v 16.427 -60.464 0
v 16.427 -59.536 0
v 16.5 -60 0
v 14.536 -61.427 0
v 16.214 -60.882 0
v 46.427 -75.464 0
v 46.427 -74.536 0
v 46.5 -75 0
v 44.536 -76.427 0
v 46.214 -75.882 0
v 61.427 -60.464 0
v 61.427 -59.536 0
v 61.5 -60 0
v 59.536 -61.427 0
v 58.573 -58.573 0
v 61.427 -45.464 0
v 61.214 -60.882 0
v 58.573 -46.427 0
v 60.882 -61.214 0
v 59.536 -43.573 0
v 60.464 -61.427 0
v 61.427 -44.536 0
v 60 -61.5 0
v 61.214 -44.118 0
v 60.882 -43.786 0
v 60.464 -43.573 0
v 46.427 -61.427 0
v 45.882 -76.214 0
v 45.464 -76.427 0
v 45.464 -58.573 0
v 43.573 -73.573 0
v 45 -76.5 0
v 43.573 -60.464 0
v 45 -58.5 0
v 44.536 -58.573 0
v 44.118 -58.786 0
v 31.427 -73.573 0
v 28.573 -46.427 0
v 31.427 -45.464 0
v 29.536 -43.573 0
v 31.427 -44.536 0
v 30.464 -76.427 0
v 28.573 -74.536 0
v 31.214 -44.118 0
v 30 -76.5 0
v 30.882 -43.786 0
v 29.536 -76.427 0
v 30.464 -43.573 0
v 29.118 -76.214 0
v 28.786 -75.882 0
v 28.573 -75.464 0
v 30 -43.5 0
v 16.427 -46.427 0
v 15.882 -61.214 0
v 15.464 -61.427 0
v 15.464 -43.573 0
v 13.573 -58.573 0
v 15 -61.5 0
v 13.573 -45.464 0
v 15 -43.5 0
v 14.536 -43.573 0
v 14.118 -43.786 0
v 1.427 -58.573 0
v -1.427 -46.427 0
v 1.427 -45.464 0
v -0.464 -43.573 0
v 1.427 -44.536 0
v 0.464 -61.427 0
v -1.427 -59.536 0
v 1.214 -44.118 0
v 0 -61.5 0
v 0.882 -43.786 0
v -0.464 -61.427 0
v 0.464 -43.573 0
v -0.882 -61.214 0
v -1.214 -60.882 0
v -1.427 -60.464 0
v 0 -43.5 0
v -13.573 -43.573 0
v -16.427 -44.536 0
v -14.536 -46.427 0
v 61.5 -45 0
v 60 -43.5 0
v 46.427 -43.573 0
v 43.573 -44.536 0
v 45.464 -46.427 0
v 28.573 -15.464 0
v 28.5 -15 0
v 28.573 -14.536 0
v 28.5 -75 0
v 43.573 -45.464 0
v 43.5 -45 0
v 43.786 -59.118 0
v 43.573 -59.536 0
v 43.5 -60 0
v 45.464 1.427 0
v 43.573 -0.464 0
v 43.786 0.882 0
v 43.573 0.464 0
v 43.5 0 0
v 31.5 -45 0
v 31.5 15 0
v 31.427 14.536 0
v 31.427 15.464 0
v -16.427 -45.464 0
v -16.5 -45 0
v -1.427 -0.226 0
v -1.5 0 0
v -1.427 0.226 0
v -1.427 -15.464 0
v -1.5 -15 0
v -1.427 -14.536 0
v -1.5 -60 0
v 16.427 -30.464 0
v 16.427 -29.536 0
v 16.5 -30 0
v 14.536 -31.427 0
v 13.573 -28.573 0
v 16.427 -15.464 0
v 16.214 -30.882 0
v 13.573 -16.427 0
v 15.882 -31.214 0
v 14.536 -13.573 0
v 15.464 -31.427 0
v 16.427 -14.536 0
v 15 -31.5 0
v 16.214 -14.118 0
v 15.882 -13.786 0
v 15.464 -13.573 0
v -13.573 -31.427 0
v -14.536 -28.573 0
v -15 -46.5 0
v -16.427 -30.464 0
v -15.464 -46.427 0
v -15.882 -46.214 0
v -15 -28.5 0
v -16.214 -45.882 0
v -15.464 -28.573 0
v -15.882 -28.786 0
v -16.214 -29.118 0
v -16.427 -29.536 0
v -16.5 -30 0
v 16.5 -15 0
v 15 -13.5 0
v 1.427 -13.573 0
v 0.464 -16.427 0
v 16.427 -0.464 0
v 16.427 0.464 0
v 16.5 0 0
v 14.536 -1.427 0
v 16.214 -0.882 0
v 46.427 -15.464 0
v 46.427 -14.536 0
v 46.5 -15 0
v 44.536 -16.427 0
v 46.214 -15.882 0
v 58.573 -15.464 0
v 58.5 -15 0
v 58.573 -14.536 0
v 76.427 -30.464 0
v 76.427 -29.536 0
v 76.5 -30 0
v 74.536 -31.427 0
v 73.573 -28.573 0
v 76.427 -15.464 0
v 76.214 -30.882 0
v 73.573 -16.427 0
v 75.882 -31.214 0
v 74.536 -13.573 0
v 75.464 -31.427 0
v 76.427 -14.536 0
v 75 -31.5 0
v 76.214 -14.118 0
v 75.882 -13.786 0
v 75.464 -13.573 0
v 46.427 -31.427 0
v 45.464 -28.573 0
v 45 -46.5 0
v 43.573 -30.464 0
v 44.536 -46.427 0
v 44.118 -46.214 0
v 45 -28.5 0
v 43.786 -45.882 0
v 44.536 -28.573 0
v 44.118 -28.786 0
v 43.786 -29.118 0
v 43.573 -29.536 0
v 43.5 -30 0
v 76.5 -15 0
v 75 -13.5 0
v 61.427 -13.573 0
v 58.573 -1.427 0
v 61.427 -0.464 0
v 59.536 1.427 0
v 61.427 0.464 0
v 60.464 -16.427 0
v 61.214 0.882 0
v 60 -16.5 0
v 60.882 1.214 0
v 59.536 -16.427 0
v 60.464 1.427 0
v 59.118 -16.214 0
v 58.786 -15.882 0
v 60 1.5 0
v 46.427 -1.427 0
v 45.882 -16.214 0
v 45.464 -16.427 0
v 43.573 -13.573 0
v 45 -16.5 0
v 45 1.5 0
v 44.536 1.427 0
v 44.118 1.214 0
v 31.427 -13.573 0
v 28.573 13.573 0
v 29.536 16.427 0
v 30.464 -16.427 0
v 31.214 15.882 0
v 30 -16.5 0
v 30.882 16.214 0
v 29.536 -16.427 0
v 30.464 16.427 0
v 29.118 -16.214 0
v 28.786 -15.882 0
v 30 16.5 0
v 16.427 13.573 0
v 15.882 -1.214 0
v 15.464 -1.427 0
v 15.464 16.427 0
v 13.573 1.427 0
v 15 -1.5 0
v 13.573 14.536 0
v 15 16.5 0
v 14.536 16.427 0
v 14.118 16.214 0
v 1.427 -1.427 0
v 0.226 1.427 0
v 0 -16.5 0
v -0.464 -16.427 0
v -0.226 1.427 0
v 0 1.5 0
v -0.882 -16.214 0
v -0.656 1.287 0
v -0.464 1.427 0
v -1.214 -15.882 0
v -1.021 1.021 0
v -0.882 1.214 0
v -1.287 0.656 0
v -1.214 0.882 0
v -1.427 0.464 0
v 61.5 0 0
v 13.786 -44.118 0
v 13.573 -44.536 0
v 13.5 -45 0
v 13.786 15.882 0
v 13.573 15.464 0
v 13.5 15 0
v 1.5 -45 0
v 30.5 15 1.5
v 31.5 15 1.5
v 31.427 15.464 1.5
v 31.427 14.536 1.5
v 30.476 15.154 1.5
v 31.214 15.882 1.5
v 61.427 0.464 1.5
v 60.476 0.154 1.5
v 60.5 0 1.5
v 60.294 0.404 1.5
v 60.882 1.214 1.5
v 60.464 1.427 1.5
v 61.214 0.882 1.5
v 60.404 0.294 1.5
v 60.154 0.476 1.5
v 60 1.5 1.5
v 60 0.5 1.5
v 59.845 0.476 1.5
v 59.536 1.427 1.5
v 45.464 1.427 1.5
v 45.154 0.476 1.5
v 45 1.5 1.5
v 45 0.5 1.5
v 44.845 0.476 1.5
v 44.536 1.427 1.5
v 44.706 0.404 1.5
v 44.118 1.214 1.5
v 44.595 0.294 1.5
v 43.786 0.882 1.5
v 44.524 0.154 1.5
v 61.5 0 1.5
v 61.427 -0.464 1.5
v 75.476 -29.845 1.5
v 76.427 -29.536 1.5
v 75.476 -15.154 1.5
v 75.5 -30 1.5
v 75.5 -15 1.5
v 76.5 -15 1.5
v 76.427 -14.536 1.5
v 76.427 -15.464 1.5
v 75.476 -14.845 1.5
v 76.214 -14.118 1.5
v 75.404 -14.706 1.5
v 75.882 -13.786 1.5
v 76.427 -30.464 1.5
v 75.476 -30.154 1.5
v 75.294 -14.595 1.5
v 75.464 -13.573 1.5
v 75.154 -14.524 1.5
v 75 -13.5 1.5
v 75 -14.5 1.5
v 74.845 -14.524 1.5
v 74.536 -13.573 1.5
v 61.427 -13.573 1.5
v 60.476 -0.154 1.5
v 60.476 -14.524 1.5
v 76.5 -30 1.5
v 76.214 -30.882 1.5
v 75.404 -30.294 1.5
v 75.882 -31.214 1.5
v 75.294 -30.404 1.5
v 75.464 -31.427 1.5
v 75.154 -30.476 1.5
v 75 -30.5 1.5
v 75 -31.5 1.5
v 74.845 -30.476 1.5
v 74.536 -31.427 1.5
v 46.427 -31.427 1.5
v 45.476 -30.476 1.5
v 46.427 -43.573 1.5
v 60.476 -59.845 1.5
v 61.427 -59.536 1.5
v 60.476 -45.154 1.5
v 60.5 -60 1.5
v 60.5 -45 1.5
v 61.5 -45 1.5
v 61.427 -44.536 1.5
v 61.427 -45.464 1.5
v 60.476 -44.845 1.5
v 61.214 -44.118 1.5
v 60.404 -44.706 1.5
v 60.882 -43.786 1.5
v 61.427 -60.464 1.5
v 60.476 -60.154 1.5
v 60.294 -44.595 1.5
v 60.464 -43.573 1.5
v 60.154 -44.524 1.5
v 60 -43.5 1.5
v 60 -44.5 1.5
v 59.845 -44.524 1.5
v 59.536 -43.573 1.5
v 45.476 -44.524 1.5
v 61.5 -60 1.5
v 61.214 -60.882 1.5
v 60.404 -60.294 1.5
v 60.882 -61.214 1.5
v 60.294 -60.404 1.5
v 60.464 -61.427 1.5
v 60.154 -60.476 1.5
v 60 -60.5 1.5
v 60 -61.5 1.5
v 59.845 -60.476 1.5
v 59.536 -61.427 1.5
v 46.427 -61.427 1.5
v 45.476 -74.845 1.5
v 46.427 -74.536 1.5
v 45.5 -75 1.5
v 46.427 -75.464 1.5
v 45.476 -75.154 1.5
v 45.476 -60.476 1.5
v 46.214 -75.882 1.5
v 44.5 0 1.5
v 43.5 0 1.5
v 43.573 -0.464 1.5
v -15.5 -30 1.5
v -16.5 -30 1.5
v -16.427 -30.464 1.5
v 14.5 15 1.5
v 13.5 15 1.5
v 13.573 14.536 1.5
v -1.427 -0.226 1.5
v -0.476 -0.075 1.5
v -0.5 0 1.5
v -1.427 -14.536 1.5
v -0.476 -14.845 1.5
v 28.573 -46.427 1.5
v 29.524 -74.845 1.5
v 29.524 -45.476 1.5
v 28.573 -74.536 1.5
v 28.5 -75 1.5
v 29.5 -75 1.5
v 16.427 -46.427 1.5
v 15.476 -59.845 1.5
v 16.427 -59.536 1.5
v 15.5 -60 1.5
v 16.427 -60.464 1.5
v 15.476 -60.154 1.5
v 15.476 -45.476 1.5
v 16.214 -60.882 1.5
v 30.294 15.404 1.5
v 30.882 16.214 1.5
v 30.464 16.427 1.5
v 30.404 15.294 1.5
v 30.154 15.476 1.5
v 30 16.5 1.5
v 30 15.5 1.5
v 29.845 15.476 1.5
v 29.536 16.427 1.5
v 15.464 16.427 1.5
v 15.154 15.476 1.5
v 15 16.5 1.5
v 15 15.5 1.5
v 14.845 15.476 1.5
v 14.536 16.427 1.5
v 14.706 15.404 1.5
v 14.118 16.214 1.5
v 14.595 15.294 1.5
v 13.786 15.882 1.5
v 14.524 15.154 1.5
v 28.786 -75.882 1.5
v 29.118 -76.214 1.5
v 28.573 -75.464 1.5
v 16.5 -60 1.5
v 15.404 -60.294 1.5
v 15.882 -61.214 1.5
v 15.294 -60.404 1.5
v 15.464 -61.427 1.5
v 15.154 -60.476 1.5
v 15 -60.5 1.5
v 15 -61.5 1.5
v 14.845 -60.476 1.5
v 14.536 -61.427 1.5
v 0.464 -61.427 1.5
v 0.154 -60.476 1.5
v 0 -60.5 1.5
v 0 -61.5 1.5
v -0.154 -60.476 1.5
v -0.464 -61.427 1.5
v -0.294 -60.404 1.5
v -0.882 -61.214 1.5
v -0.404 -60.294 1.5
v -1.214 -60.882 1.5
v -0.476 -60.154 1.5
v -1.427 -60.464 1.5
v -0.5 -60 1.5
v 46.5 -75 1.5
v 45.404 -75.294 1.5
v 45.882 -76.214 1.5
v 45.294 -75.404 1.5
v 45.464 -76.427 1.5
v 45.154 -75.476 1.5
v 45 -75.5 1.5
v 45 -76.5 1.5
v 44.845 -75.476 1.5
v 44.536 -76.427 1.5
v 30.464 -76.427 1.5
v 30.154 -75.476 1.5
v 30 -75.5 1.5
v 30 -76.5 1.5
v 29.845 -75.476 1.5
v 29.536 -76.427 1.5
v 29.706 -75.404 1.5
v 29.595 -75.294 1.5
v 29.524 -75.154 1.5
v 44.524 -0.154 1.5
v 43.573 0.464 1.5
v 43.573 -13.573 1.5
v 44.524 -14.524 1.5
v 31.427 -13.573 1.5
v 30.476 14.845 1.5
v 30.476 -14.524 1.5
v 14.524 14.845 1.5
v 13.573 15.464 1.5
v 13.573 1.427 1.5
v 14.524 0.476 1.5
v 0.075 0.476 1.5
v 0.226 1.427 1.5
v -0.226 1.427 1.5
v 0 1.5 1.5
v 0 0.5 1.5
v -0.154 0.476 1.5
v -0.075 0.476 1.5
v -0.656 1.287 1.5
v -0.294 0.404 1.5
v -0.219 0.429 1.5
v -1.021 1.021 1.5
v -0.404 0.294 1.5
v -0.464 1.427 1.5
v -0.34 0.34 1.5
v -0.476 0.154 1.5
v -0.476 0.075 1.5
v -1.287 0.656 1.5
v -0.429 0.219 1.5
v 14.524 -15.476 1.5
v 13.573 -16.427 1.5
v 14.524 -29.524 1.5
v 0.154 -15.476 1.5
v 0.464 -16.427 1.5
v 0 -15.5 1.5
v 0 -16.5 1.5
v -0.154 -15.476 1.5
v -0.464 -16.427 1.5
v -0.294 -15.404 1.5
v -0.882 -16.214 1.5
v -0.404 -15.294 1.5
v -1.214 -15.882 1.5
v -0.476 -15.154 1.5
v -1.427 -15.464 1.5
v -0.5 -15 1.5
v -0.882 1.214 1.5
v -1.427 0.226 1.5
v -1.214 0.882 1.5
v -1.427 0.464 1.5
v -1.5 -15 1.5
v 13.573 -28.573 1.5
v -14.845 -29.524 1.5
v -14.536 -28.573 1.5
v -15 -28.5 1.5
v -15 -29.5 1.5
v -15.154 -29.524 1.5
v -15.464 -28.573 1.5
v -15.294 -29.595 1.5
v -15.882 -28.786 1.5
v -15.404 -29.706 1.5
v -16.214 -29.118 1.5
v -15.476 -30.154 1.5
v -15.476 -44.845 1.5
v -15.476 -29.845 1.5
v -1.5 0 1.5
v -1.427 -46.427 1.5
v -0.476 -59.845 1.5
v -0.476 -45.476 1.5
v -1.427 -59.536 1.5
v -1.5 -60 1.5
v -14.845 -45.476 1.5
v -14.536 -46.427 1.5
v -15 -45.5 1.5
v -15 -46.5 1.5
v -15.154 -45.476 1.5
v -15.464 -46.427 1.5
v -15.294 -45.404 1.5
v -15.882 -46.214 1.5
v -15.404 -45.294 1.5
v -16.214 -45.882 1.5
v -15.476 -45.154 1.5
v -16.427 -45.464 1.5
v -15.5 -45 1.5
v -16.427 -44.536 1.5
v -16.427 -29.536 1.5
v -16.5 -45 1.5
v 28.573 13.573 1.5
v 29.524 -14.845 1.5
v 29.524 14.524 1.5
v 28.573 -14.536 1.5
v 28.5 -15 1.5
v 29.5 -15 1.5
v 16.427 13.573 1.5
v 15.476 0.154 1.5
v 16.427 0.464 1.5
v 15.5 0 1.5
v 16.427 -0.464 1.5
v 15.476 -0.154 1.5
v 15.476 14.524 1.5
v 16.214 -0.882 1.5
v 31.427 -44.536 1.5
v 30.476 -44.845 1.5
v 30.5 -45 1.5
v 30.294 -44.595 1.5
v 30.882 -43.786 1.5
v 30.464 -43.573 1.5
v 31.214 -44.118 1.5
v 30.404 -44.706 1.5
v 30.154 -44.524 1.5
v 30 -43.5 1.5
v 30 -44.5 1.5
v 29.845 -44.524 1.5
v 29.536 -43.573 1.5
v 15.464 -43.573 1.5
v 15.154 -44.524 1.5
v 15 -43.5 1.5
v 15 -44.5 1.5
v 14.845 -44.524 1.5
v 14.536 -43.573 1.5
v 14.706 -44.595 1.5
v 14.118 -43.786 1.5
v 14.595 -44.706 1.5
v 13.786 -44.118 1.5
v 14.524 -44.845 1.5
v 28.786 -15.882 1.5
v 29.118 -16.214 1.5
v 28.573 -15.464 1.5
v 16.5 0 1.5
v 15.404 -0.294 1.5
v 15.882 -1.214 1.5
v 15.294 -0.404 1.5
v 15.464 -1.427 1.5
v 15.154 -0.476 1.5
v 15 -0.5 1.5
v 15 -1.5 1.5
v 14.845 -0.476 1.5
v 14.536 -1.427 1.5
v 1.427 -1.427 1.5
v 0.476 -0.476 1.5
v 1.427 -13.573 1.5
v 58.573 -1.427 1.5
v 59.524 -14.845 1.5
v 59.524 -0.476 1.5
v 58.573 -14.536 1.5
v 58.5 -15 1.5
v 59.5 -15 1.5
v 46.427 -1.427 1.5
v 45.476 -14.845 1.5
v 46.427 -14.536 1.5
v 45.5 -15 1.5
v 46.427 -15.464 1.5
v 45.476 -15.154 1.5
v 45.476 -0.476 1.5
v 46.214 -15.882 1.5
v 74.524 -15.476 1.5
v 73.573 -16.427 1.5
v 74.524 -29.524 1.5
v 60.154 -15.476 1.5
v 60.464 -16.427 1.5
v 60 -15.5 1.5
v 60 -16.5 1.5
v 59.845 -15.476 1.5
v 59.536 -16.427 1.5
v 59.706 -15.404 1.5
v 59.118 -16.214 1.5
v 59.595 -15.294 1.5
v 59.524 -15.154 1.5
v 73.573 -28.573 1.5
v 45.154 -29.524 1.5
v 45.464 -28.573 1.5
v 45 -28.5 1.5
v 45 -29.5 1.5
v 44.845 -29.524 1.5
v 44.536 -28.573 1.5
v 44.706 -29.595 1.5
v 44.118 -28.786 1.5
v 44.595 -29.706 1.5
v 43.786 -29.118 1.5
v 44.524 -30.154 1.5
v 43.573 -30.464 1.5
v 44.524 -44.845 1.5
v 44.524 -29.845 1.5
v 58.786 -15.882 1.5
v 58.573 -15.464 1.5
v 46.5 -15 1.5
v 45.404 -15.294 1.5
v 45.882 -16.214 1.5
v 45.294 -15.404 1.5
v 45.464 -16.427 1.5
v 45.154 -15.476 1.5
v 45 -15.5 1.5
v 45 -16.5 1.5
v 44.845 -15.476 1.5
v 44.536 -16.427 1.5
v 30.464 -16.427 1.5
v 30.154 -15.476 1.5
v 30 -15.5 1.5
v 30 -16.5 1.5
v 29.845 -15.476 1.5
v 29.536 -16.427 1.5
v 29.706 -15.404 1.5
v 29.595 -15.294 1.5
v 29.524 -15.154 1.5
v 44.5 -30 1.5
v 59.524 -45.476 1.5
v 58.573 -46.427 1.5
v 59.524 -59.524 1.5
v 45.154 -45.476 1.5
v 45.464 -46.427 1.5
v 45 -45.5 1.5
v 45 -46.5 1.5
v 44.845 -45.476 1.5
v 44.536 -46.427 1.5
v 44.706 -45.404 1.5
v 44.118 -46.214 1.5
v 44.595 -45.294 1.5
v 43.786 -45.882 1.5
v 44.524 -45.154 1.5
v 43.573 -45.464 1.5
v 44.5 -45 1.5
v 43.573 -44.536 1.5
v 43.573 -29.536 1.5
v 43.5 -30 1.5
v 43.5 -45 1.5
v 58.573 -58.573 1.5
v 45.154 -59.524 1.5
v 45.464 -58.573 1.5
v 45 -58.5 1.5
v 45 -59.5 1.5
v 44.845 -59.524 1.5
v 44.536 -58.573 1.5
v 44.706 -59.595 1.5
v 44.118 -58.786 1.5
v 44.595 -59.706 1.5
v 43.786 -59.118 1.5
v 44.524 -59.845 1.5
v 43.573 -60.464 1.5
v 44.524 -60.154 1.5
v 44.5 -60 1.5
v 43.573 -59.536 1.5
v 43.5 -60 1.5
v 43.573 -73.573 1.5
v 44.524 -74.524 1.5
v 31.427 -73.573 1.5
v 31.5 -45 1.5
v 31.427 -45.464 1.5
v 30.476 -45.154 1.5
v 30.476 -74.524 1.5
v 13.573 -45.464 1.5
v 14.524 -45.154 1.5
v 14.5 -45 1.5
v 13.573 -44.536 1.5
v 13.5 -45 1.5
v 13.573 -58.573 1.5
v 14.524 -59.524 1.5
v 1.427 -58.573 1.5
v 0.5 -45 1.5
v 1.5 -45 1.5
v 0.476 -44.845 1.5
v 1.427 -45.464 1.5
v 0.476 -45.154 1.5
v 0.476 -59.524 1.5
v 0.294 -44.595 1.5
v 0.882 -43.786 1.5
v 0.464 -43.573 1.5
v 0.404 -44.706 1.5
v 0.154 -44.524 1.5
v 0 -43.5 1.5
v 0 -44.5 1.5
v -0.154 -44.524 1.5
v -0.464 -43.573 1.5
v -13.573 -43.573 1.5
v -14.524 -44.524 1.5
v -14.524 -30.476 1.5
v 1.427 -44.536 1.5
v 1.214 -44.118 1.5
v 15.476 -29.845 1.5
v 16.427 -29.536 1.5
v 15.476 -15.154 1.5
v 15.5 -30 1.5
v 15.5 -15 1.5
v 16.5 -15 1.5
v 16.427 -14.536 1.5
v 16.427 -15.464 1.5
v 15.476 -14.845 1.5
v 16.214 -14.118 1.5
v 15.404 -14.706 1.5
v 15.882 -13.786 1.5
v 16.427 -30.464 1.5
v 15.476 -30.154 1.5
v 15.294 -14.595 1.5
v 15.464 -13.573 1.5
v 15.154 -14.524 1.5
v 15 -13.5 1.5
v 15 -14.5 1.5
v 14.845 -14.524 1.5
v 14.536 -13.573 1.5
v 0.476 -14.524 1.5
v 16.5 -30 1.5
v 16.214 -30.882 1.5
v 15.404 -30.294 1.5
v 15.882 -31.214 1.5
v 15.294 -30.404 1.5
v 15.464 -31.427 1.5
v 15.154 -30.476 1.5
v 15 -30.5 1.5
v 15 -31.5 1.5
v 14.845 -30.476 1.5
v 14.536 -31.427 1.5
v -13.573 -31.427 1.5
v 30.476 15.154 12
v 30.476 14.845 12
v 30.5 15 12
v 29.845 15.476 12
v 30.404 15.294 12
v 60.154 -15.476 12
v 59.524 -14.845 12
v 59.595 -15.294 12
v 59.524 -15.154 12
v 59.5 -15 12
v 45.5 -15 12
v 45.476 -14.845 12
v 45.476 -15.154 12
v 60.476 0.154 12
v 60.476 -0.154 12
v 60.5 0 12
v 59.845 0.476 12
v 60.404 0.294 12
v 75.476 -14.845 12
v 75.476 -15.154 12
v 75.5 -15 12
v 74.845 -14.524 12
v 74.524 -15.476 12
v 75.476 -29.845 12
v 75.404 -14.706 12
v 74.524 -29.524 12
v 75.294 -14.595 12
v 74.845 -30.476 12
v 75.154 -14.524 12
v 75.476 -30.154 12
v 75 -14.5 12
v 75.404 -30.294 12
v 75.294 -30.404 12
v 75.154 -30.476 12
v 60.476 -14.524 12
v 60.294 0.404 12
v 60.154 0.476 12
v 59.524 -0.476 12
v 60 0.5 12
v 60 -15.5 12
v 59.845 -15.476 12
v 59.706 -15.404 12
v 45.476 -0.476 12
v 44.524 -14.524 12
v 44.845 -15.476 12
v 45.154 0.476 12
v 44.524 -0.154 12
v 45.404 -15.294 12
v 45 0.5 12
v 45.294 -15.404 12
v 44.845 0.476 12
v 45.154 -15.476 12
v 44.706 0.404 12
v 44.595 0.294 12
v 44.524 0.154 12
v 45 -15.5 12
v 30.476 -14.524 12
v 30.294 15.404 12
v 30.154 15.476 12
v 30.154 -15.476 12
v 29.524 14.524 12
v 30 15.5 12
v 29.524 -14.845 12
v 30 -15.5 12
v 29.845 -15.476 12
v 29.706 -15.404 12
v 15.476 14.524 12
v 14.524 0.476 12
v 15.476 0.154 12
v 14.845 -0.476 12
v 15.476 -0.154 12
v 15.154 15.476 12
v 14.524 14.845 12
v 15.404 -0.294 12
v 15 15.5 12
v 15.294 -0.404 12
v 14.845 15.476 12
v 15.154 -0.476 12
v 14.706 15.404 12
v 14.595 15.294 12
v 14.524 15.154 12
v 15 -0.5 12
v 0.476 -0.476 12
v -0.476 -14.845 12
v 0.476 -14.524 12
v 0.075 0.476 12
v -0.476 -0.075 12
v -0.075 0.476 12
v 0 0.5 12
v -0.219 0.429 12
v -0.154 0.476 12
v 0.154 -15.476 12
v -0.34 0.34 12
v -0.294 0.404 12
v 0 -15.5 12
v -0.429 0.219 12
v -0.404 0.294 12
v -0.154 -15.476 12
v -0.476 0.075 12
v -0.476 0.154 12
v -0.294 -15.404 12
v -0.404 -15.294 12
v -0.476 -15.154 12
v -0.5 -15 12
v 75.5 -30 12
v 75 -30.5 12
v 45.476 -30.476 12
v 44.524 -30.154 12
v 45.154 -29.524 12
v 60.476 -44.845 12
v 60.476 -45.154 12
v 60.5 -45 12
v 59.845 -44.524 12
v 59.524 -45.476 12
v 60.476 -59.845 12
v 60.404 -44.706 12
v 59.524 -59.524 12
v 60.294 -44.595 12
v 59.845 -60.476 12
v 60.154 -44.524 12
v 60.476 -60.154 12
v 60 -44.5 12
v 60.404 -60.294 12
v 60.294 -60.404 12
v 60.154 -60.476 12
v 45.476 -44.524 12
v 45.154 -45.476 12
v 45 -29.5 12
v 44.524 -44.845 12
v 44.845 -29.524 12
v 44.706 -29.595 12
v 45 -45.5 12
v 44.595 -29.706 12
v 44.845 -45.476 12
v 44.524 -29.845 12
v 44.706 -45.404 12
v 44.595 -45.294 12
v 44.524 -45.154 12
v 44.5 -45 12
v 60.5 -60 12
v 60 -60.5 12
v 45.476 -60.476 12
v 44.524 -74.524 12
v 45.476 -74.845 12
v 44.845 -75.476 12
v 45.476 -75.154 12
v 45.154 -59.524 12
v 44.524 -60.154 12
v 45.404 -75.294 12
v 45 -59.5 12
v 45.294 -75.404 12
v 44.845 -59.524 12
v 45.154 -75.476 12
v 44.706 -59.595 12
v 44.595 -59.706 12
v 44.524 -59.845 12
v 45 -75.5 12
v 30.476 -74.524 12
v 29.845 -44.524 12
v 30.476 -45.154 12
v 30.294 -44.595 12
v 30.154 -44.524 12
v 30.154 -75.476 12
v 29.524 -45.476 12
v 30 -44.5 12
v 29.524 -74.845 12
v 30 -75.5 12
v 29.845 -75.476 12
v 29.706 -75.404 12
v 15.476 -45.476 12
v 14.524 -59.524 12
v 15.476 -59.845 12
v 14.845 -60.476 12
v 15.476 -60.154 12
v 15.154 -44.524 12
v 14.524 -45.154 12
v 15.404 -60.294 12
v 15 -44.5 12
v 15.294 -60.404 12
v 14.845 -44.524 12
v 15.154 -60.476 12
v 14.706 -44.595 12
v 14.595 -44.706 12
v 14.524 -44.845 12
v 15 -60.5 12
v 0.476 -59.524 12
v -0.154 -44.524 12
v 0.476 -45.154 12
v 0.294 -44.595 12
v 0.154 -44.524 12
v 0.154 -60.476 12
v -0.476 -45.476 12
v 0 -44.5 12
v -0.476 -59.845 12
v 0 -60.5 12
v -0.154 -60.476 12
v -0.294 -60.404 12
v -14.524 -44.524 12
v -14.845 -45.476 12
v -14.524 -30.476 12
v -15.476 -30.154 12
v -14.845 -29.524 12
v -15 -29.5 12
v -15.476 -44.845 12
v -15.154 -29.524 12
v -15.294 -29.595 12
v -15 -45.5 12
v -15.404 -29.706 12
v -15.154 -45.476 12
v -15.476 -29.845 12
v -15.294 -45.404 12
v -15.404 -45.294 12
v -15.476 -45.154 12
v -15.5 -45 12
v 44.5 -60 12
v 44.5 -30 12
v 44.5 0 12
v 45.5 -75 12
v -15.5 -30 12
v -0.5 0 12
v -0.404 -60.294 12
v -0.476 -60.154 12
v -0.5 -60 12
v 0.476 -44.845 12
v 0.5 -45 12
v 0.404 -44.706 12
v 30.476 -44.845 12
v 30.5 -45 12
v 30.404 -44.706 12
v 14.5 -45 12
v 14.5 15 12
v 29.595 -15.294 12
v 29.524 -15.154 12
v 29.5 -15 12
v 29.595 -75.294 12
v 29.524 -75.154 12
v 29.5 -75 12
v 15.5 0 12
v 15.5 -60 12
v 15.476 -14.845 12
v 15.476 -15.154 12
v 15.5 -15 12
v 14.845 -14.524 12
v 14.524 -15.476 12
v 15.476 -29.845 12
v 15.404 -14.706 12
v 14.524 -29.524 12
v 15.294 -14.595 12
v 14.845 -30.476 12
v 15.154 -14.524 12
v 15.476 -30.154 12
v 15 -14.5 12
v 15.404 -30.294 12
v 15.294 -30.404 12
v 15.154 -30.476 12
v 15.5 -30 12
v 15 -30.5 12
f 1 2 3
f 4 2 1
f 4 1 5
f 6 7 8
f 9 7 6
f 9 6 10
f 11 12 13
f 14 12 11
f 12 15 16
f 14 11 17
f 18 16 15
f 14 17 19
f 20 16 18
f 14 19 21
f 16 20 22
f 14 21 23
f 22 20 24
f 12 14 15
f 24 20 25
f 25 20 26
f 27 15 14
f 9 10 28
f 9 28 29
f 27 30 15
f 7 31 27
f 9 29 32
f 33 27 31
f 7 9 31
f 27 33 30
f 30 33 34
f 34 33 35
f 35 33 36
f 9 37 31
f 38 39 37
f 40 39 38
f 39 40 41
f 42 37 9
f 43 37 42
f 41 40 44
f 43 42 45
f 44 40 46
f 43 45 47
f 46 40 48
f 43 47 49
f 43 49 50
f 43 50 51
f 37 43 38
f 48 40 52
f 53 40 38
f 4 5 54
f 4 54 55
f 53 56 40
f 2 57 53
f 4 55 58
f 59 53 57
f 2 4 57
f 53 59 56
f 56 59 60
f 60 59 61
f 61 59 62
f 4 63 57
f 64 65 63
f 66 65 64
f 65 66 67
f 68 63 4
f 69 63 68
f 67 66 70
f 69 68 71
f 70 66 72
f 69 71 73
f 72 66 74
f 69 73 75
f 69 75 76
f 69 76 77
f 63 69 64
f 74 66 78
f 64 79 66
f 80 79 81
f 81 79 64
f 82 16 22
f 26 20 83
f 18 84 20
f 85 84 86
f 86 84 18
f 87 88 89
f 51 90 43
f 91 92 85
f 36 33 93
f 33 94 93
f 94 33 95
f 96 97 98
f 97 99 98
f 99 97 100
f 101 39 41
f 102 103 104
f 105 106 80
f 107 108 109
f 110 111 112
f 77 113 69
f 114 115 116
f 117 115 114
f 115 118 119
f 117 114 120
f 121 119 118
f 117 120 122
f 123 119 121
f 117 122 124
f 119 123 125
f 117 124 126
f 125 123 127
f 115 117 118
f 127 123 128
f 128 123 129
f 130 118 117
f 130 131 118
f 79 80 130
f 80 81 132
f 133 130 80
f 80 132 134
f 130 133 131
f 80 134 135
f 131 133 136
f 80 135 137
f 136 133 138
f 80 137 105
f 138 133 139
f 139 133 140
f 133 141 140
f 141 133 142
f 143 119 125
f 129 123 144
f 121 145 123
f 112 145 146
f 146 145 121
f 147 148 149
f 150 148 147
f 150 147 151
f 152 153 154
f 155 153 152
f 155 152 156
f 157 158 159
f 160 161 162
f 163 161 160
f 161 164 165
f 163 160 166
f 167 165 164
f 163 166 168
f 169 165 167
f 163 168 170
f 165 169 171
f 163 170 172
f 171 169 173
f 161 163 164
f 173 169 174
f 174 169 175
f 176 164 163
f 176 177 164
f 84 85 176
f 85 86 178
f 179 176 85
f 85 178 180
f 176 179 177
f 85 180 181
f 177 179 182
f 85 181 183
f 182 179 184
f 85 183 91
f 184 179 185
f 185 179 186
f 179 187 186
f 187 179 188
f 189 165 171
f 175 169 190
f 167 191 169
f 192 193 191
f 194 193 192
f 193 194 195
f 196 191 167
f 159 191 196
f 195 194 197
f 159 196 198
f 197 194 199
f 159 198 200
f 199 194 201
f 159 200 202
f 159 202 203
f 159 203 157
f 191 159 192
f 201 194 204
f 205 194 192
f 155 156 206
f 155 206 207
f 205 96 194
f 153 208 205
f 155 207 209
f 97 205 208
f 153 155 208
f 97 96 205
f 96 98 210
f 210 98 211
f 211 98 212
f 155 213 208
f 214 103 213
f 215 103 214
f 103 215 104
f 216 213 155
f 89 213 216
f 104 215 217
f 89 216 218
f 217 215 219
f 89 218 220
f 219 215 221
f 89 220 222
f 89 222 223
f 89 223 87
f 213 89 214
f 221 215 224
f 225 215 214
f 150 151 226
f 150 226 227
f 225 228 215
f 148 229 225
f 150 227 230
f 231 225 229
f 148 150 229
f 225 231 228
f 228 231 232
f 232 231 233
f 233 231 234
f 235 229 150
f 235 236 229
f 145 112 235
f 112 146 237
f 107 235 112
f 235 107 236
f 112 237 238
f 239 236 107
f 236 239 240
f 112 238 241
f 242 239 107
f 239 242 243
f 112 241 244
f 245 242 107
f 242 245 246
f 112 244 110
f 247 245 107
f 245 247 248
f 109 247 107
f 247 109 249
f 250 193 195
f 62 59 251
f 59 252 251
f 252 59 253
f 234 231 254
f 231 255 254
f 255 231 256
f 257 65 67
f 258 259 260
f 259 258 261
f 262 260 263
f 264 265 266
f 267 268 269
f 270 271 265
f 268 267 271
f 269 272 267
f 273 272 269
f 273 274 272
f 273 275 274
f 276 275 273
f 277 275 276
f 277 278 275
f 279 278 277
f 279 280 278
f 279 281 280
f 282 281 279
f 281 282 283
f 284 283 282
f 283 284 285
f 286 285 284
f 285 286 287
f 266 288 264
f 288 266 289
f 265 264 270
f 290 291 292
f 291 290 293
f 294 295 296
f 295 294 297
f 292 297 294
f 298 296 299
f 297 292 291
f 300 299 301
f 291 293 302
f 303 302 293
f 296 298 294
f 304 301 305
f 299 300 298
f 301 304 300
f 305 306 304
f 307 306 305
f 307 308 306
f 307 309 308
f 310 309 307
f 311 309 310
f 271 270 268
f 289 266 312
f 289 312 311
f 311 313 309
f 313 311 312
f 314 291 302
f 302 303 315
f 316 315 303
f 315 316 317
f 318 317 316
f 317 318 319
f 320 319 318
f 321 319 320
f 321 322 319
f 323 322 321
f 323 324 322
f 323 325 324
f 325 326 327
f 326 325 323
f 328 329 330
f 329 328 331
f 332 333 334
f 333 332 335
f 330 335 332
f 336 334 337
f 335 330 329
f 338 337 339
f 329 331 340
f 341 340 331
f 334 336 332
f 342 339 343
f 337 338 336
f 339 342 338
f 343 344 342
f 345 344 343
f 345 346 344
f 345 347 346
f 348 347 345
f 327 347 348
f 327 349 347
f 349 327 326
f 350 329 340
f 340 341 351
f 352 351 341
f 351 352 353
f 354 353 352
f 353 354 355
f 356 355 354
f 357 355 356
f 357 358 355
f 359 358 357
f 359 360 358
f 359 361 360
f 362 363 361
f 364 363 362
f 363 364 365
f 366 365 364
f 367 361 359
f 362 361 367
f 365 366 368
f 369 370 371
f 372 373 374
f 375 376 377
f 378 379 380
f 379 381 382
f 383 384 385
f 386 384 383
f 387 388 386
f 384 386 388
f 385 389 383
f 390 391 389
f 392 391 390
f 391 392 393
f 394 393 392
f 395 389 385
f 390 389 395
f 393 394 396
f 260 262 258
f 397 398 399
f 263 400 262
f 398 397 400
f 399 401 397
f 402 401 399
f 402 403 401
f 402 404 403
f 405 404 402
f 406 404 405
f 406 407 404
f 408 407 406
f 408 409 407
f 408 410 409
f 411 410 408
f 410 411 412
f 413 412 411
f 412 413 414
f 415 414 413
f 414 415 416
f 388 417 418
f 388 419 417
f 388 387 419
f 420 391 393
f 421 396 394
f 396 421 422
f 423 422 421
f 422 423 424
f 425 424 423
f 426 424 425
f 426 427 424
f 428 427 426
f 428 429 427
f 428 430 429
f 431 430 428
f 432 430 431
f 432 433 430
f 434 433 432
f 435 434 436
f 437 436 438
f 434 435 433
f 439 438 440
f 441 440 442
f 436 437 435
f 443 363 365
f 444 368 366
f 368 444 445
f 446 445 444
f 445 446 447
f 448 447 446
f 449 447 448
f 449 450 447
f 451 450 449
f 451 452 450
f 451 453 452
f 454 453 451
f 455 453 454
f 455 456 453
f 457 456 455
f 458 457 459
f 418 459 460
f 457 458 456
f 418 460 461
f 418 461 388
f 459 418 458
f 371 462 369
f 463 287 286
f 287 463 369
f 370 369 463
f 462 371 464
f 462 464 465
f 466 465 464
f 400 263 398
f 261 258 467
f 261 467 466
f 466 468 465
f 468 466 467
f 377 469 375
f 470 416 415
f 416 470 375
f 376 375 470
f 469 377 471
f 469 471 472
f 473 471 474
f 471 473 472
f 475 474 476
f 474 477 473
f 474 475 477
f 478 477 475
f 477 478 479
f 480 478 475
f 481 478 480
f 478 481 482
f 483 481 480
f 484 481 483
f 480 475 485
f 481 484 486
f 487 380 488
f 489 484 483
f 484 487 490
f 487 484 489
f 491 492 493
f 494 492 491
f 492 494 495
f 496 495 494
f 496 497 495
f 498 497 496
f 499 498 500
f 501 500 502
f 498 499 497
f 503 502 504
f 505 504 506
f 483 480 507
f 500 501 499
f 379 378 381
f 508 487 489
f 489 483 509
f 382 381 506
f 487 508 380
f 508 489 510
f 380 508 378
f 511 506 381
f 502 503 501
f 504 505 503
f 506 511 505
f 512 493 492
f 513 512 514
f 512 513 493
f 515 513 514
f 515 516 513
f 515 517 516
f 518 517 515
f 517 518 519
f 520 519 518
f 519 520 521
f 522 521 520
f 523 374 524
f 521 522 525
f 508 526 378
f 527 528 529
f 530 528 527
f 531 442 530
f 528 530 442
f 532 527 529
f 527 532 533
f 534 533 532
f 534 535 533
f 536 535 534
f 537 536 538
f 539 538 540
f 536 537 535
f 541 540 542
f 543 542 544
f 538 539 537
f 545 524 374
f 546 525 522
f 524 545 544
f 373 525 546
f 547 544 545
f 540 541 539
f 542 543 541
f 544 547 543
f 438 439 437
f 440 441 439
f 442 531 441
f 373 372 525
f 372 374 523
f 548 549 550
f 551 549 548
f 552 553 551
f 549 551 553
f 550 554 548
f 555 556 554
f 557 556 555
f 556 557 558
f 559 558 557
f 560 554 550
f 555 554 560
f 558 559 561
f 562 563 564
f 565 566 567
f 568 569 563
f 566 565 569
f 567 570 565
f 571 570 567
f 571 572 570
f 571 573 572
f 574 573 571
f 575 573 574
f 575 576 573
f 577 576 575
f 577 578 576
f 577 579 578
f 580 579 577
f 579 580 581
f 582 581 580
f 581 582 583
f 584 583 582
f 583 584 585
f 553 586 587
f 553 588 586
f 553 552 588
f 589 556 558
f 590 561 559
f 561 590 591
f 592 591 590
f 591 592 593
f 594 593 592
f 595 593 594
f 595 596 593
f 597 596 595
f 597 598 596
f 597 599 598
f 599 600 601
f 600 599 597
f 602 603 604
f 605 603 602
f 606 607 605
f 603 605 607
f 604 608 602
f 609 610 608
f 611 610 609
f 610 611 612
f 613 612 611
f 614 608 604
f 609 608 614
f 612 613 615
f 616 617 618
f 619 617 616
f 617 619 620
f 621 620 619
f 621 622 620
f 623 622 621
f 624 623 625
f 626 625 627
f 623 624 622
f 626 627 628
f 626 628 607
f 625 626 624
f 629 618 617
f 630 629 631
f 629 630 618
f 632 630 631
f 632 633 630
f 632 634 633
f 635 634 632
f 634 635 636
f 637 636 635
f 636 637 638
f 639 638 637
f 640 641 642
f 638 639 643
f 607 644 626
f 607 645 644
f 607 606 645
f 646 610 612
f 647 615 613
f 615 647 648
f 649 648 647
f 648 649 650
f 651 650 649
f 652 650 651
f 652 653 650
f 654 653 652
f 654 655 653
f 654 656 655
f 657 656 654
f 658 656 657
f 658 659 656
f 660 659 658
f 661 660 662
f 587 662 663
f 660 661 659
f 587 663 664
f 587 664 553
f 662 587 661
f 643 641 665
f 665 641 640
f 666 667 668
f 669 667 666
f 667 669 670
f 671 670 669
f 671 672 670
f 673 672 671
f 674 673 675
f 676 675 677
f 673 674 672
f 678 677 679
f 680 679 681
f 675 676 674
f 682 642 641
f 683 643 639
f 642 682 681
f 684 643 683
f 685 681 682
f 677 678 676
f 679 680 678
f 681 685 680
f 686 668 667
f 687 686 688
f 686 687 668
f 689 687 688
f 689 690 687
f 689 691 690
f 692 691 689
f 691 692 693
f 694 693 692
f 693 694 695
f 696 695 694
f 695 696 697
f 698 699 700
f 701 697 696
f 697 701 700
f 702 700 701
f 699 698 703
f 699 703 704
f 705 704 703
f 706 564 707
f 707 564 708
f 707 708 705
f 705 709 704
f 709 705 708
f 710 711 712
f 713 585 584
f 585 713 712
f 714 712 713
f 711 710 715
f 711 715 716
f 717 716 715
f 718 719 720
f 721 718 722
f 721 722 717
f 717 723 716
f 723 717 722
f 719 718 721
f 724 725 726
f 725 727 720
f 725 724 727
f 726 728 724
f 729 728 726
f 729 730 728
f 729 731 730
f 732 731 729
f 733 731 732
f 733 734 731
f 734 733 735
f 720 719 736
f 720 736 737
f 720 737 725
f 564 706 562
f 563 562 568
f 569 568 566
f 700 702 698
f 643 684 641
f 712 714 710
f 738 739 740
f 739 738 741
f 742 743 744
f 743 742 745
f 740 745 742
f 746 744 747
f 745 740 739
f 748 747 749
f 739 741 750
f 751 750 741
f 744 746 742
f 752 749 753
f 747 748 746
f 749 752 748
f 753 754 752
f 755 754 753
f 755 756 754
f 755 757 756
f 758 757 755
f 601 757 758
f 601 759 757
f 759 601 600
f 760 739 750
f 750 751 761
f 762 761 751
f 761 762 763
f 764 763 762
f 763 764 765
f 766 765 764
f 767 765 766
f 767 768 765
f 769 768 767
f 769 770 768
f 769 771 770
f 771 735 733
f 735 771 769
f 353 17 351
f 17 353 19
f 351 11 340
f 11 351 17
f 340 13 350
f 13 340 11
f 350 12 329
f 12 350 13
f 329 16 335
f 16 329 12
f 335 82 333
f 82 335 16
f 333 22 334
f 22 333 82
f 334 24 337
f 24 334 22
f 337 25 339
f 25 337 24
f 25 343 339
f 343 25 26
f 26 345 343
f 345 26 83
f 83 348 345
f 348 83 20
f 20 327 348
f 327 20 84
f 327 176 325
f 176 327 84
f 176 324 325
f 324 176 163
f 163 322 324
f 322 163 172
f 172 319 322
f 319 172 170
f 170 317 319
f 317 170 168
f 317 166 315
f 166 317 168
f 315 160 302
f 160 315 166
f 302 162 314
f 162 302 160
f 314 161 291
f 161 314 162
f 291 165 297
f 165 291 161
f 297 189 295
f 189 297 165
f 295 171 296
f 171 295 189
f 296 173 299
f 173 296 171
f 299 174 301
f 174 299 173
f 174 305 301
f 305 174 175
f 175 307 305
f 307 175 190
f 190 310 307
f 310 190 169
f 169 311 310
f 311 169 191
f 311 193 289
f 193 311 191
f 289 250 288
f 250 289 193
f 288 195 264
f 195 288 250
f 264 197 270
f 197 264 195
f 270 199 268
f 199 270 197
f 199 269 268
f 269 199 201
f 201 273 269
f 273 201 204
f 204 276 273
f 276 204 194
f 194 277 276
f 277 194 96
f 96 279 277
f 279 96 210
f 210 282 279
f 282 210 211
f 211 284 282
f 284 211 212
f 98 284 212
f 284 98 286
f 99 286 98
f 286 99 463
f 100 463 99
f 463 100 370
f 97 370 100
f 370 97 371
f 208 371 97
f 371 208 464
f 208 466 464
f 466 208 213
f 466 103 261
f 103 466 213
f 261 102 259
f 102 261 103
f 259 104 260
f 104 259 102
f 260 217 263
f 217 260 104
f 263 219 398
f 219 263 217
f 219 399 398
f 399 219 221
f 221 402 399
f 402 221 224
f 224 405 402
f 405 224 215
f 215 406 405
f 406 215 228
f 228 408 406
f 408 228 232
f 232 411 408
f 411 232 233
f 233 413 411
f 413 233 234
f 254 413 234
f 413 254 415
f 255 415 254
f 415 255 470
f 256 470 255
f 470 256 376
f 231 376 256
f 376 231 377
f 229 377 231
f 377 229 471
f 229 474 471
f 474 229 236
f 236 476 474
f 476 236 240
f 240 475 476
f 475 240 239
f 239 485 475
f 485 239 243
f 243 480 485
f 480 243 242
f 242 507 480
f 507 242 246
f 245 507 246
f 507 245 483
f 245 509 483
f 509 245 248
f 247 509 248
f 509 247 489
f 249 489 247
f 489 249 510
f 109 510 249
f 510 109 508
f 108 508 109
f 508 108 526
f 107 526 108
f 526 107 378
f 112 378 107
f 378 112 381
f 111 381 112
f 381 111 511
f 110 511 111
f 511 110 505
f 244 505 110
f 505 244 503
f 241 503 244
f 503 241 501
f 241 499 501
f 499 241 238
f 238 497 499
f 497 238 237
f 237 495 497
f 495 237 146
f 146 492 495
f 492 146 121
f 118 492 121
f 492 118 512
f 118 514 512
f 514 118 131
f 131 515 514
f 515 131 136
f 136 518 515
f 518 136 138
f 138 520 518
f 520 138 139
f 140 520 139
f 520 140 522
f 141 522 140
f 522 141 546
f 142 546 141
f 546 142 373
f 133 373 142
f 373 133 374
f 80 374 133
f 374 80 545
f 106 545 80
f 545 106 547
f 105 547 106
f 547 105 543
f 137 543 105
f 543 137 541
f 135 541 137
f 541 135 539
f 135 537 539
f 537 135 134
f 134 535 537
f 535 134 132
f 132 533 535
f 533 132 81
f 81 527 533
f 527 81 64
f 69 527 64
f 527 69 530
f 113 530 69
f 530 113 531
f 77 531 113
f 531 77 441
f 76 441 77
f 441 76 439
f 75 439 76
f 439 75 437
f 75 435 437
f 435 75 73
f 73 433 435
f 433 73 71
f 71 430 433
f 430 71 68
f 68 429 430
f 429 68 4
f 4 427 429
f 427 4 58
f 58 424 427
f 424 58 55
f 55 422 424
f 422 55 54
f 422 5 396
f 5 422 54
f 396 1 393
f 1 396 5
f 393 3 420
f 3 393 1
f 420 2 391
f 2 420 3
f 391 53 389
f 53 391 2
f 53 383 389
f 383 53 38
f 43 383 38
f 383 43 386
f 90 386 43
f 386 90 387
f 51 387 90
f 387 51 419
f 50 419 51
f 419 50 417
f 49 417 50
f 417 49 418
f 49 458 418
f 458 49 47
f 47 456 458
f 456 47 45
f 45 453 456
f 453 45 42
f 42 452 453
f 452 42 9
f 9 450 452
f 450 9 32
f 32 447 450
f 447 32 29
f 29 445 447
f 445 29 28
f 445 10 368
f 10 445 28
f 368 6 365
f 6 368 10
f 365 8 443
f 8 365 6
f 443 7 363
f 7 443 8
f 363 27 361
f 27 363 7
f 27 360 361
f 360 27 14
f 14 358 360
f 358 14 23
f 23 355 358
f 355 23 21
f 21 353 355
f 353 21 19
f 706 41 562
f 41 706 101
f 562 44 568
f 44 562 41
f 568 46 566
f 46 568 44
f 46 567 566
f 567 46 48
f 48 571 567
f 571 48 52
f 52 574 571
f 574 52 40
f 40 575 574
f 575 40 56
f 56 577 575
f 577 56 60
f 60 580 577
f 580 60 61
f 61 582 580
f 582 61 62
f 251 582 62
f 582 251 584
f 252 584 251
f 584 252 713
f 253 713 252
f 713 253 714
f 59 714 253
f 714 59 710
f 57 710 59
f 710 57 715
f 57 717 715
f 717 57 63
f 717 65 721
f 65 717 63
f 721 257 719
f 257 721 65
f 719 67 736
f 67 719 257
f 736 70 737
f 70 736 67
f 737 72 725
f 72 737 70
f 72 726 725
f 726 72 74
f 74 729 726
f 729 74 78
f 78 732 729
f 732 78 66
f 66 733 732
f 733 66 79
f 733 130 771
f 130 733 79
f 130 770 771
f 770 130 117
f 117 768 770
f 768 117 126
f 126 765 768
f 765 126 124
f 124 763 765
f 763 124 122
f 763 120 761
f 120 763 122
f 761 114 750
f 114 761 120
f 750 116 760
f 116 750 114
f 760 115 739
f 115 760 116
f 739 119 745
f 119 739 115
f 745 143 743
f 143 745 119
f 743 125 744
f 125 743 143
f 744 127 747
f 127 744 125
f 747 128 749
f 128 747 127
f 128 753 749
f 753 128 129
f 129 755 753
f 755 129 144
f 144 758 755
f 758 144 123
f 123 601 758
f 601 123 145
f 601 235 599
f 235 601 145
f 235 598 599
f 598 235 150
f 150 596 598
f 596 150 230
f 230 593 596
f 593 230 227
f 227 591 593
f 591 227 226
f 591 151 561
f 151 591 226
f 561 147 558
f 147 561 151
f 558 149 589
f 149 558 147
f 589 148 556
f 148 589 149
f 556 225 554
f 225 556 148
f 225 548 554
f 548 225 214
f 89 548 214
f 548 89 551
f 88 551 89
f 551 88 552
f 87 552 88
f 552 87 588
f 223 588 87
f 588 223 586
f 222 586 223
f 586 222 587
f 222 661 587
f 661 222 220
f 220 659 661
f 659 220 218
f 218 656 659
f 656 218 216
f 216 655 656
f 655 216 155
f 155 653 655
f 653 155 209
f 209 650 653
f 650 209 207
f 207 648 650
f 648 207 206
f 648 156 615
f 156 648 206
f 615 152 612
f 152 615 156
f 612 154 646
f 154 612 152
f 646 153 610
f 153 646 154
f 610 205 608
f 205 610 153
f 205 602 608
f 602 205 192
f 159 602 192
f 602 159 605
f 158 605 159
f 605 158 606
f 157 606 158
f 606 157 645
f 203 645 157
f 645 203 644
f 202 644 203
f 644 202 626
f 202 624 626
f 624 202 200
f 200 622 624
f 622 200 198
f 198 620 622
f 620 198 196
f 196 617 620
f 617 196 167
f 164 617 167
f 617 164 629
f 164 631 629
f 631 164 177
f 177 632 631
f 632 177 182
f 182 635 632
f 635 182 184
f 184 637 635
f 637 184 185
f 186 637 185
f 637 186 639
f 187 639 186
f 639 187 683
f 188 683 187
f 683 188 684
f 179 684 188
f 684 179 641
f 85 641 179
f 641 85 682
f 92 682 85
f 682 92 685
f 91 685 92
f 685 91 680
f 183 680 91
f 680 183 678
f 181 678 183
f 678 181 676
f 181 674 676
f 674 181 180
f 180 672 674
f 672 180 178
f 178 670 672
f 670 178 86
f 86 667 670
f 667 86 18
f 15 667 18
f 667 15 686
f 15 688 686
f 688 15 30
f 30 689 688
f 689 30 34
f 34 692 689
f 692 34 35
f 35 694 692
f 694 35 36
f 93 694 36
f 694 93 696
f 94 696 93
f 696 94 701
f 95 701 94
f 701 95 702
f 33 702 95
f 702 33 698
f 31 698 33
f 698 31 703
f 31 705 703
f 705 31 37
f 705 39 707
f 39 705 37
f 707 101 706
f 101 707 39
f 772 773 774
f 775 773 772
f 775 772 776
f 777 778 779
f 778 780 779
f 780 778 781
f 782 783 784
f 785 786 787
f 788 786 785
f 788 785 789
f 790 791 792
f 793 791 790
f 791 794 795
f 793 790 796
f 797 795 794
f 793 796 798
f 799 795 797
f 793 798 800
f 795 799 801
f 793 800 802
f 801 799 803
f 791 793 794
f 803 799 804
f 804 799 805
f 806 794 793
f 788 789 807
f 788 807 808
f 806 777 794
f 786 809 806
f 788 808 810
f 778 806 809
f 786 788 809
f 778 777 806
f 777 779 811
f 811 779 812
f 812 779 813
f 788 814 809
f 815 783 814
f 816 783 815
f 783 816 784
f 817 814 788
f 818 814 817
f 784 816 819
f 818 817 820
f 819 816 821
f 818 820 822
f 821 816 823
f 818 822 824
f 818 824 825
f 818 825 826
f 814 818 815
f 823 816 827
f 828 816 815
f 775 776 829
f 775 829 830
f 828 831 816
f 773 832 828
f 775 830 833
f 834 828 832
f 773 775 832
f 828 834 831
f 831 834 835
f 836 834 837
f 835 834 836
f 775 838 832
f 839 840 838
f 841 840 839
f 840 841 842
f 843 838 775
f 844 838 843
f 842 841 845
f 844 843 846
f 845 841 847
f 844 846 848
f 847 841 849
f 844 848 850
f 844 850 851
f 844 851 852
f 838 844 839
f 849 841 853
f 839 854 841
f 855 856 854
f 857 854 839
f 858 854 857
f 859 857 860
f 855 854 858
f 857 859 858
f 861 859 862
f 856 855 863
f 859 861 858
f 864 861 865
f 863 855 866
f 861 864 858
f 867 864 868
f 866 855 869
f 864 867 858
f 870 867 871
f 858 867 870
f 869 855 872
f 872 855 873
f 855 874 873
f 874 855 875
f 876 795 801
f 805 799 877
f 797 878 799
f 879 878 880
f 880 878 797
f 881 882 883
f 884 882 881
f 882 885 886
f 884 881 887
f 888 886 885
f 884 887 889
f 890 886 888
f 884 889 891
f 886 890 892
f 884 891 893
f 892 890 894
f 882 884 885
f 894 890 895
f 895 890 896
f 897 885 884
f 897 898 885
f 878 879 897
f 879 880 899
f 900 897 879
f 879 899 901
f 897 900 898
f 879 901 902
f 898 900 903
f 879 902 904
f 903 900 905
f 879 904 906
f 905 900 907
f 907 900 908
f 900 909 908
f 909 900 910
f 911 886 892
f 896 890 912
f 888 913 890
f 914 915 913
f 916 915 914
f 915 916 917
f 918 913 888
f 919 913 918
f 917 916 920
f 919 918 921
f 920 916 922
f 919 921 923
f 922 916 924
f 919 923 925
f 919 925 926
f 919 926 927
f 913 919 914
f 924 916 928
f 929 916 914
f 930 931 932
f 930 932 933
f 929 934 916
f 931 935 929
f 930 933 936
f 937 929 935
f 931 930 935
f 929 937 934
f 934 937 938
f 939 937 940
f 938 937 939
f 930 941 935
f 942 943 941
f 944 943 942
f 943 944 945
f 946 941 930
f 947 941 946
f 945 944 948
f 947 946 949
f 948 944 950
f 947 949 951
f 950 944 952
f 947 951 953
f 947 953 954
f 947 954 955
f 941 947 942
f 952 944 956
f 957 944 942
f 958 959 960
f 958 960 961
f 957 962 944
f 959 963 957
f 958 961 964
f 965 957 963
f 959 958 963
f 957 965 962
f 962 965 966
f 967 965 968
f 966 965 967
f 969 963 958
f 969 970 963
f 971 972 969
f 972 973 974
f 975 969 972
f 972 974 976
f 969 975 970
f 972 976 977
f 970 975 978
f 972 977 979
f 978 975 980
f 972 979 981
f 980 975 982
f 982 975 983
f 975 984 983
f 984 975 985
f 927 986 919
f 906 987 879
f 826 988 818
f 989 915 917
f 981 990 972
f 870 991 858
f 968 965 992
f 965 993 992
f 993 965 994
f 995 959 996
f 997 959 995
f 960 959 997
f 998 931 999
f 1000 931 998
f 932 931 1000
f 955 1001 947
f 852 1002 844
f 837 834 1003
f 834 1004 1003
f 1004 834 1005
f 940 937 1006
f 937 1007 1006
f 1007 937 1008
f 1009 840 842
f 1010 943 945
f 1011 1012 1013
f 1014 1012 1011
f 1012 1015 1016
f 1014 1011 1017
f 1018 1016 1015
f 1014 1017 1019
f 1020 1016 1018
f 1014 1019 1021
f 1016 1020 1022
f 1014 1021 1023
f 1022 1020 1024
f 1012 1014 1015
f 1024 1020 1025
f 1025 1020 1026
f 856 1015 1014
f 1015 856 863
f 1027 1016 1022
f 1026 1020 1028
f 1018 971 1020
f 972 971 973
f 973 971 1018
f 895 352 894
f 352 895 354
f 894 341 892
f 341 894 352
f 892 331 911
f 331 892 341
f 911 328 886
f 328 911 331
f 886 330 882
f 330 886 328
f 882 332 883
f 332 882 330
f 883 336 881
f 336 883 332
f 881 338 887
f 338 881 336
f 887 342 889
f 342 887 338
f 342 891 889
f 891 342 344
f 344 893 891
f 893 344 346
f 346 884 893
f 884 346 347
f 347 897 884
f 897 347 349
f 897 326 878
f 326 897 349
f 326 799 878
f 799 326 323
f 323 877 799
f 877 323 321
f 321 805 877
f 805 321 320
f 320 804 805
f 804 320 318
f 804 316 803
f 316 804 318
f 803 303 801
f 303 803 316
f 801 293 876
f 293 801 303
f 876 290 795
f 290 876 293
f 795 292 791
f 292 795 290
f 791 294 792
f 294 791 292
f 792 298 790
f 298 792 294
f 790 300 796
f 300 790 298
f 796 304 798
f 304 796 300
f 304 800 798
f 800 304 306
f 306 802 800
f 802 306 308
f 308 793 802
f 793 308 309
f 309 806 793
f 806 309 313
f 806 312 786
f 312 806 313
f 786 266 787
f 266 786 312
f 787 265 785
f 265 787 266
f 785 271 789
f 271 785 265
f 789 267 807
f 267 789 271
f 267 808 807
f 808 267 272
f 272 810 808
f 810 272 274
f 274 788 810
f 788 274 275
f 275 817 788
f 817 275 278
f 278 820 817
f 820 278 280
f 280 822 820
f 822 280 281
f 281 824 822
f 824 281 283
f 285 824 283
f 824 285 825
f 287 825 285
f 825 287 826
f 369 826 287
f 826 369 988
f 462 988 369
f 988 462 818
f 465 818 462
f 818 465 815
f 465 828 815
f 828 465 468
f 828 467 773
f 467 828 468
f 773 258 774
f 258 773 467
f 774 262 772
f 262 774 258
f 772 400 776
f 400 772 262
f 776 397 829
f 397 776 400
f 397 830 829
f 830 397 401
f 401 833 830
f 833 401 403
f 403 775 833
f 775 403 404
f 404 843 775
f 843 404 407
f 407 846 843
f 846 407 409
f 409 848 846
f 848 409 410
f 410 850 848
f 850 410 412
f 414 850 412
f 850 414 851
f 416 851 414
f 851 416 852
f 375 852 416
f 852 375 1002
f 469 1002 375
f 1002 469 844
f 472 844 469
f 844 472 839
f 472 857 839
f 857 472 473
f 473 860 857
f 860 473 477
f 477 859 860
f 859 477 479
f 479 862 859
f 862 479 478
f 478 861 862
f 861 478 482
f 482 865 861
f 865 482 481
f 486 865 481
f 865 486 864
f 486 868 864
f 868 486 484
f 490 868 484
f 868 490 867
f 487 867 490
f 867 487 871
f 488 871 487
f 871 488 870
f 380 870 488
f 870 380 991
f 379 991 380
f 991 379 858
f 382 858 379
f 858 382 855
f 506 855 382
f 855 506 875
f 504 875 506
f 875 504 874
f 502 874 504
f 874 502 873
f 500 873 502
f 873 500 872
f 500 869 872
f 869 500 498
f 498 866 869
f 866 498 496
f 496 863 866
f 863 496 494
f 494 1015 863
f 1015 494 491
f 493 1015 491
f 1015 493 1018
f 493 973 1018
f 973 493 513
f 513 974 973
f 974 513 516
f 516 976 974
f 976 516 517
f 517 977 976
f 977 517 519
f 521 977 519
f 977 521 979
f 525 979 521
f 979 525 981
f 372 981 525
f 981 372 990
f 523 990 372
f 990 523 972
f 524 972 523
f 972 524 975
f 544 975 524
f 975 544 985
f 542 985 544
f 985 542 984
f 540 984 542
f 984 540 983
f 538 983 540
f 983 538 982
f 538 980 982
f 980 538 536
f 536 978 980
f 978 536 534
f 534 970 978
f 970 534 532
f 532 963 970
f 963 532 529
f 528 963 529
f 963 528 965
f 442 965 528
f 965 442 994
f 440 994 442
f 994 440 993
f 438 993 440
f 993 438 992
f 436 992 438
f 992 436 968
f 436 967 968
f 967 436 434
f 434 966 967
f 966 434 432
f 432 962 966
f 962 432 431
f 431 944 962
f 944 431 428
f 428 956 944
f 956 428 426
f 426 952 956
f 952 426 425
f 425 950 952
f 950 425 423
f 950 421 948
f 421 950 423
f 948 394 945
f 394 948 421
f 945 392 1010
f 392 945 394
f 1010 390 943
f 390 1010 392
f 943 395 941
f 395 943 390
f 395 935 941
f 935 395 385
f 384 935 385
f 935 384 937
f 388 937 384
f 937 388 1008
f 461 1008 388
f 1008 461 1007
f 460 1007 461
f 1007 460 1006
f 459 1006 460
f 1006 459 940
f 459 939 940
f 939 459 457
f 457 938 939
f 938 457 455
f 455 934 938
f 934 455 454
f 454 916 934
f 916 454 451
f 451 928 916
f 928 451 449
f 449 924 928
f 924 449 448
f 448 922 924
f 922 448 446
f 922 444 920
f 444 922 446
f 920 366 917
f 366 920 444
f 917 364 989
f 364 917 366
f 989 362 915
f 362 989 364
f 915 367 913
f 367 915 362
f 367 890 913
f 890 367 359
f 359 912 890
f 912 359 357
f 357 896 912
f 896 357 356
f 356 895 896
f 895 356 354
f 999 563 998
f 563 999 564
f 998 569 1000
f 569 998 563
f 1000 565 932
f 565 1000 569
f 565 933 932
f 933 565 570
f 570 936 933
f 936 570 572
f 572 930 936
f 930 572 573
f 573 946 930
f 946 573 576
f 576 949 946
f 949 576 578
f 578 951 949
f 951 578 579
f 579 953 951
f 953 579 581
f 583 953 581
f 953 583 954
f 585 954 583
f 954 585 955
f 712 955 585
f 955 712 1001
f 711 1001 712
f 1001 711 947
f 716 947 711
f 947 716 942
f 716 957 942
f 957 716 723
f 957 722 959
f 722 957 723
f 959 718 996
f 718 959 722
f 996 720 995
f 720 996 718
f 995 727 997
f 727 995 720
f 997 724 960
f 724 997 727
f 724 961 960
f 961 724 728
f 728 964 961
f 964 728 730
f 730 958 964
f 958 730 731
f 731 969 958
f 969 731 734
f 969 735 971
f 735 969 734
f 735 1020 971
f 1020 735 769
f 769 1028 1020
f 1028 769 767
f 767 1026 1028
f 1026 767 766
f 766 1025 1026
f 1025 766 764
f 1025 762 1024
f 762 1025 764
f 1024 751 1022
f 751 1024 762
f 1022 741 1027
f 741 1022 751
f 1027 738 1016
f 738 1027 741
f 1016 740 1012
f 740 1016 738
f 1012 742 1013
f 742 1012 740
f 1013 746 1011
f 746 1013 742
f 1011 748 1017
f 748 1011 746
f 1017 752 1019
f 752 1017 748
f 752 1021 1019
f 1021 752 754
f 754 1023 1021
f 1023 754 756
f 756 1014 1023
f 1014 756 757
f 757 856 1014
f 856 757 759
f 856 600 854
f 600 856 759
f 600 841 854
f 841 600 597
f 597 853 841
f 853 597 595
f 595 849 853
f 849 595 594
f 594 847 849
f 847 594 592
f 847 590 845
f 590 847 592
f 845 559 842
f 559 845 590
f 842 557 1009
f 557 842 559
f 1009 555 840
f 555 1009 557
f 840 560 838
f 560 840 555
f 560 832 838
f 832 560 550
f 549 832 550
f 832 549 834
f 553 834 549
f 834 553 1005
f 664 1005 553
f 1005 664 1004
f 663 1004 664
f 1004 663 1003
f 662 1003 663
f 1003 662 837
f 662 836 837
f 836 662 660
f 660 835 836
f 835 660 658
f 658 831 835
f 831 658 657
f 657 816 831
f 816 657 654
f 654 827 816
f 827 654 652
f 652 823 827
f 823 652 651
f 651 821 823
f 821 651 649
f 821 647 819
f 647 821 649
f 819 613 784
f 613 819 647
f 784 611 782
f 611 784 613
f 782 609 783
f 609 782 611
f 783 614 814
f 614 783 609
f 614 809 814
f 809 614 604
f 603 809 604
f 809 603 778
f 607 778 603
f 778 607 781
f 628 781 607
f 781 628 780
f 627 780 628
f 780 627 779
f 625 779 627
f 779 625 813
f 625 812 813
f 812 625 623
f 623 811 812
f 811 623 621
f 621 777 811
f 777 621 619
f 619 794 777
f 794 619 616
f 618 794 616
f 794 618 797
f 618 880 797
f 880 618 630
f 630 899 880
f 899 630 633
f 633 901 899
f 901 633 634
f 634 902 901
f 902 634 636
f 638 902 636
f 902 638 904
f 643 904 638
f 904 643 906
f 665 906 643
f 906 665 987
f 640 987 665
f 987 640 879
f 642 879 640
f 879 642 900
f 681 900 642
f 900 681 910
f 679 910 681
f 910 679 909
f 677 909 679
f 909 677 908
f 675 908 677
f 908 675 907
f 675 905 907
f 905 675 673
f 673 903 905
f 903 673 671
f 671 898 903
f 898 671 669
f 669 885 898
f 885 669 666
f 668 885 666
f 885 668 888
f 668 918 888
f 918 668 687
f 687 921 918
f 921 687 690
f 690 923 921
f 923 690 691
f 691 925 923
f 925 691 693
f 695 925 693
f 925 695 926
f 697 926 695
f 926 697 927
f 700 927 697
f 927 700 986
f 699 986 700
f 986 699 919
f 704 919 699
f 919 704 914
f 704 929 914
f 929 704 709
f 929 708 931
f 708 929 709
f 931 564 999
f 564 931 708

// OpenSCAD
// file: lsystem.scad
//<skip>
// F=forward, -/+=yaw, ^/&=pitch, </>=roll, s/S=scale down/up, [/]=push/pop
rules = [["A", "^F[s^^F>>>>>>A]>>>[s^^F>>>>>>A]>>>>>[s^^F>>>>>>A]"]];
axiom = "FA";
forward = 5;
angle = 15;
iterations = 5;
scaling = 1.1;

module dummy() {};

baseState  = [ [], identityMatrix() ];
functions = 
    [ 
      ["F", ["m", forwardMatrix(forward)]],
      ["-", ["m", yawMatrix(angle)]],
      ["+", ["m", yawMatrix(-angle)]],
      ["^", ["m", pitchMatrix(angle)]],
      ["&", ["m", pitchMatrix(-angle)]],
      [">", ["m", rollMatrix(angle)]],
      ["<", ["m", rollMatrix(-angle)]],
      ["s", ["m", scaleMatrix(1/scaling)]],
      ["S", ["m", scaleMatrix(scaling)]],
      ["[", ["push"]],
      ["]", ["pop"]]
      ];
//</skip>

function isString(v) = v >= ""; // this seems to be the fastest way

// search without not-found warnings
function lookup(c, r) 
    = let(r1 = concat(r, [[c,c]]))
        r1[search(c, r1)[0]][1];
        
function rest(list) = len(list)<=1 ? [] : [for(i=[1:len(list)-1]) list[i]];        

function cat(strings, i=0, sofar="")
    = i>=len(strings) ? sofar : cat(strings, i=i+1, sofar=str(sofar,strings[i]));

function evolve1(rules, axiom) 
    = cat([for (i=[0:len(axiom)-1]) lookup(axiom[i], rules)]);

function lsystem(rules, axiom, n=1) 
    = n==0 ? axiom
             : lsystem(rules, evolve1(rules, axiom), n=n-1);
             
function pitchMatrix(angle) 
    = [[cos(angle), 0, -sin(angle),0],
                [0,          1, 0,0],
                [sin(angle), 0, cos(angle),0],
                [0,0,0,1]];
    
function yawMatrix(angle)
    =  [[cos(angle), -sin(angle), 0,0],
                [sin(angle), cos(angle),0,0],
                [0,          0,          1,0],
                [0,0,0,1]];
    
function rollMatrix(angle)
    = [[1,          0,          0,0],
                [0, cos(angle),-sin(angle),0],
                [0, sin(angle),cos(angle),0],
                [0,0,0,1]
                ];
                
function forwardMatrix(distance)
    = [[1,0,0,distance], [0,1,0,0], [0,0,1,0], [0,0,0,1]];
                
function scaleMatrix(s)
    = [[s,0,0,0], [0,s,0,0], [0,0,s,0], [0,0,0,1]];
                
      
function identityMatrix()
    = [[1,0,0,0], [0,1,0,0], [0,0,1,0], [0,0,0,1]];
                
      
function evolveState1(f, state) =
    isString(f) ? state :
    f[0] == "m" ? [ state[0], state[1]*f[1] ] : 
    f[0] == "push" ? concat([ concat([rest(state)], state[0]) ], rest(state)) :
    f[0] == "pop" ? concat([rest(state[0])], state[0][0]) :
    state;          
    
// make a list of successive states, omitting the stack
function evolveState(string, functions, state, n=0, soFar=[]) =
    n >= len(string) ? concat(soFar, [rest(state)]) :
        evolveState(string, functions,
            evolveState1(lookup(string[n],functions), state),
            n=n+1, soFar=concat(soFar, [rest(state)]));

module traceStates(states) {
    for (i=[1:len(states)-1])
        hull() {
            multmatrix(states[i-1][0]) children();
            multmatrix(states[i][0]) children();
        }
}

module drawLSystem(rules,axiom,n,functions,baseState=[ [], identityMatrix() ]) {
    traceStates(evolveState(lsystem(rules,axiom,n), functions, baseState)) children();
}

//<skip>
rotate([0,-90,0]) drawLSystem(rules,axiom,iterations,functions) sphere(1,$fn=4);
//</skip>
// main file
use <lsystem.scad>;

//<params>
wallFlareWidth = 3;
wallFlareThickness = 1.5;
wallHeight = 12;
wallWidth = 1;

lineSegment = 15;
iterations = 1;

angle = 90;
axiom = "F+F+F+F";
rules = [["F", "F-F+F+FF-F-F+F"]];
//</params>

module dummy();

forward = lineSegment;

baseState  = [ [], identityMatrix() ];
functions = 
    [ 
      ["F", ["m", forwardMatrix(forward)]],
      ["-", ["m", yawMatrix(angle)]],
      ["+", ["m", yawMatrix(-angle)]],
      ["^", ["m", pitchMatrix(angle)]],
      ["&", ["m", pitchMatrix(-angle)]],
      [">", ["m", rollMatrix(angle)]],
      ["<", ["m", rollMatrix(-angle)]],
      ["[", ["push"]],
      ["]", ["pop"]]
      ];

out = lsystem(rules,axiom,iterations);
states = evolveState(out,functions, baseState);
linear_extrude(height=wallFlareThickness) traceStates(states) circle(d=wallFlareWidth,$fn=10);
linear_extrude(height=wallHeight) traceStates(states) circle(d=wallWidth,$fn=10);
